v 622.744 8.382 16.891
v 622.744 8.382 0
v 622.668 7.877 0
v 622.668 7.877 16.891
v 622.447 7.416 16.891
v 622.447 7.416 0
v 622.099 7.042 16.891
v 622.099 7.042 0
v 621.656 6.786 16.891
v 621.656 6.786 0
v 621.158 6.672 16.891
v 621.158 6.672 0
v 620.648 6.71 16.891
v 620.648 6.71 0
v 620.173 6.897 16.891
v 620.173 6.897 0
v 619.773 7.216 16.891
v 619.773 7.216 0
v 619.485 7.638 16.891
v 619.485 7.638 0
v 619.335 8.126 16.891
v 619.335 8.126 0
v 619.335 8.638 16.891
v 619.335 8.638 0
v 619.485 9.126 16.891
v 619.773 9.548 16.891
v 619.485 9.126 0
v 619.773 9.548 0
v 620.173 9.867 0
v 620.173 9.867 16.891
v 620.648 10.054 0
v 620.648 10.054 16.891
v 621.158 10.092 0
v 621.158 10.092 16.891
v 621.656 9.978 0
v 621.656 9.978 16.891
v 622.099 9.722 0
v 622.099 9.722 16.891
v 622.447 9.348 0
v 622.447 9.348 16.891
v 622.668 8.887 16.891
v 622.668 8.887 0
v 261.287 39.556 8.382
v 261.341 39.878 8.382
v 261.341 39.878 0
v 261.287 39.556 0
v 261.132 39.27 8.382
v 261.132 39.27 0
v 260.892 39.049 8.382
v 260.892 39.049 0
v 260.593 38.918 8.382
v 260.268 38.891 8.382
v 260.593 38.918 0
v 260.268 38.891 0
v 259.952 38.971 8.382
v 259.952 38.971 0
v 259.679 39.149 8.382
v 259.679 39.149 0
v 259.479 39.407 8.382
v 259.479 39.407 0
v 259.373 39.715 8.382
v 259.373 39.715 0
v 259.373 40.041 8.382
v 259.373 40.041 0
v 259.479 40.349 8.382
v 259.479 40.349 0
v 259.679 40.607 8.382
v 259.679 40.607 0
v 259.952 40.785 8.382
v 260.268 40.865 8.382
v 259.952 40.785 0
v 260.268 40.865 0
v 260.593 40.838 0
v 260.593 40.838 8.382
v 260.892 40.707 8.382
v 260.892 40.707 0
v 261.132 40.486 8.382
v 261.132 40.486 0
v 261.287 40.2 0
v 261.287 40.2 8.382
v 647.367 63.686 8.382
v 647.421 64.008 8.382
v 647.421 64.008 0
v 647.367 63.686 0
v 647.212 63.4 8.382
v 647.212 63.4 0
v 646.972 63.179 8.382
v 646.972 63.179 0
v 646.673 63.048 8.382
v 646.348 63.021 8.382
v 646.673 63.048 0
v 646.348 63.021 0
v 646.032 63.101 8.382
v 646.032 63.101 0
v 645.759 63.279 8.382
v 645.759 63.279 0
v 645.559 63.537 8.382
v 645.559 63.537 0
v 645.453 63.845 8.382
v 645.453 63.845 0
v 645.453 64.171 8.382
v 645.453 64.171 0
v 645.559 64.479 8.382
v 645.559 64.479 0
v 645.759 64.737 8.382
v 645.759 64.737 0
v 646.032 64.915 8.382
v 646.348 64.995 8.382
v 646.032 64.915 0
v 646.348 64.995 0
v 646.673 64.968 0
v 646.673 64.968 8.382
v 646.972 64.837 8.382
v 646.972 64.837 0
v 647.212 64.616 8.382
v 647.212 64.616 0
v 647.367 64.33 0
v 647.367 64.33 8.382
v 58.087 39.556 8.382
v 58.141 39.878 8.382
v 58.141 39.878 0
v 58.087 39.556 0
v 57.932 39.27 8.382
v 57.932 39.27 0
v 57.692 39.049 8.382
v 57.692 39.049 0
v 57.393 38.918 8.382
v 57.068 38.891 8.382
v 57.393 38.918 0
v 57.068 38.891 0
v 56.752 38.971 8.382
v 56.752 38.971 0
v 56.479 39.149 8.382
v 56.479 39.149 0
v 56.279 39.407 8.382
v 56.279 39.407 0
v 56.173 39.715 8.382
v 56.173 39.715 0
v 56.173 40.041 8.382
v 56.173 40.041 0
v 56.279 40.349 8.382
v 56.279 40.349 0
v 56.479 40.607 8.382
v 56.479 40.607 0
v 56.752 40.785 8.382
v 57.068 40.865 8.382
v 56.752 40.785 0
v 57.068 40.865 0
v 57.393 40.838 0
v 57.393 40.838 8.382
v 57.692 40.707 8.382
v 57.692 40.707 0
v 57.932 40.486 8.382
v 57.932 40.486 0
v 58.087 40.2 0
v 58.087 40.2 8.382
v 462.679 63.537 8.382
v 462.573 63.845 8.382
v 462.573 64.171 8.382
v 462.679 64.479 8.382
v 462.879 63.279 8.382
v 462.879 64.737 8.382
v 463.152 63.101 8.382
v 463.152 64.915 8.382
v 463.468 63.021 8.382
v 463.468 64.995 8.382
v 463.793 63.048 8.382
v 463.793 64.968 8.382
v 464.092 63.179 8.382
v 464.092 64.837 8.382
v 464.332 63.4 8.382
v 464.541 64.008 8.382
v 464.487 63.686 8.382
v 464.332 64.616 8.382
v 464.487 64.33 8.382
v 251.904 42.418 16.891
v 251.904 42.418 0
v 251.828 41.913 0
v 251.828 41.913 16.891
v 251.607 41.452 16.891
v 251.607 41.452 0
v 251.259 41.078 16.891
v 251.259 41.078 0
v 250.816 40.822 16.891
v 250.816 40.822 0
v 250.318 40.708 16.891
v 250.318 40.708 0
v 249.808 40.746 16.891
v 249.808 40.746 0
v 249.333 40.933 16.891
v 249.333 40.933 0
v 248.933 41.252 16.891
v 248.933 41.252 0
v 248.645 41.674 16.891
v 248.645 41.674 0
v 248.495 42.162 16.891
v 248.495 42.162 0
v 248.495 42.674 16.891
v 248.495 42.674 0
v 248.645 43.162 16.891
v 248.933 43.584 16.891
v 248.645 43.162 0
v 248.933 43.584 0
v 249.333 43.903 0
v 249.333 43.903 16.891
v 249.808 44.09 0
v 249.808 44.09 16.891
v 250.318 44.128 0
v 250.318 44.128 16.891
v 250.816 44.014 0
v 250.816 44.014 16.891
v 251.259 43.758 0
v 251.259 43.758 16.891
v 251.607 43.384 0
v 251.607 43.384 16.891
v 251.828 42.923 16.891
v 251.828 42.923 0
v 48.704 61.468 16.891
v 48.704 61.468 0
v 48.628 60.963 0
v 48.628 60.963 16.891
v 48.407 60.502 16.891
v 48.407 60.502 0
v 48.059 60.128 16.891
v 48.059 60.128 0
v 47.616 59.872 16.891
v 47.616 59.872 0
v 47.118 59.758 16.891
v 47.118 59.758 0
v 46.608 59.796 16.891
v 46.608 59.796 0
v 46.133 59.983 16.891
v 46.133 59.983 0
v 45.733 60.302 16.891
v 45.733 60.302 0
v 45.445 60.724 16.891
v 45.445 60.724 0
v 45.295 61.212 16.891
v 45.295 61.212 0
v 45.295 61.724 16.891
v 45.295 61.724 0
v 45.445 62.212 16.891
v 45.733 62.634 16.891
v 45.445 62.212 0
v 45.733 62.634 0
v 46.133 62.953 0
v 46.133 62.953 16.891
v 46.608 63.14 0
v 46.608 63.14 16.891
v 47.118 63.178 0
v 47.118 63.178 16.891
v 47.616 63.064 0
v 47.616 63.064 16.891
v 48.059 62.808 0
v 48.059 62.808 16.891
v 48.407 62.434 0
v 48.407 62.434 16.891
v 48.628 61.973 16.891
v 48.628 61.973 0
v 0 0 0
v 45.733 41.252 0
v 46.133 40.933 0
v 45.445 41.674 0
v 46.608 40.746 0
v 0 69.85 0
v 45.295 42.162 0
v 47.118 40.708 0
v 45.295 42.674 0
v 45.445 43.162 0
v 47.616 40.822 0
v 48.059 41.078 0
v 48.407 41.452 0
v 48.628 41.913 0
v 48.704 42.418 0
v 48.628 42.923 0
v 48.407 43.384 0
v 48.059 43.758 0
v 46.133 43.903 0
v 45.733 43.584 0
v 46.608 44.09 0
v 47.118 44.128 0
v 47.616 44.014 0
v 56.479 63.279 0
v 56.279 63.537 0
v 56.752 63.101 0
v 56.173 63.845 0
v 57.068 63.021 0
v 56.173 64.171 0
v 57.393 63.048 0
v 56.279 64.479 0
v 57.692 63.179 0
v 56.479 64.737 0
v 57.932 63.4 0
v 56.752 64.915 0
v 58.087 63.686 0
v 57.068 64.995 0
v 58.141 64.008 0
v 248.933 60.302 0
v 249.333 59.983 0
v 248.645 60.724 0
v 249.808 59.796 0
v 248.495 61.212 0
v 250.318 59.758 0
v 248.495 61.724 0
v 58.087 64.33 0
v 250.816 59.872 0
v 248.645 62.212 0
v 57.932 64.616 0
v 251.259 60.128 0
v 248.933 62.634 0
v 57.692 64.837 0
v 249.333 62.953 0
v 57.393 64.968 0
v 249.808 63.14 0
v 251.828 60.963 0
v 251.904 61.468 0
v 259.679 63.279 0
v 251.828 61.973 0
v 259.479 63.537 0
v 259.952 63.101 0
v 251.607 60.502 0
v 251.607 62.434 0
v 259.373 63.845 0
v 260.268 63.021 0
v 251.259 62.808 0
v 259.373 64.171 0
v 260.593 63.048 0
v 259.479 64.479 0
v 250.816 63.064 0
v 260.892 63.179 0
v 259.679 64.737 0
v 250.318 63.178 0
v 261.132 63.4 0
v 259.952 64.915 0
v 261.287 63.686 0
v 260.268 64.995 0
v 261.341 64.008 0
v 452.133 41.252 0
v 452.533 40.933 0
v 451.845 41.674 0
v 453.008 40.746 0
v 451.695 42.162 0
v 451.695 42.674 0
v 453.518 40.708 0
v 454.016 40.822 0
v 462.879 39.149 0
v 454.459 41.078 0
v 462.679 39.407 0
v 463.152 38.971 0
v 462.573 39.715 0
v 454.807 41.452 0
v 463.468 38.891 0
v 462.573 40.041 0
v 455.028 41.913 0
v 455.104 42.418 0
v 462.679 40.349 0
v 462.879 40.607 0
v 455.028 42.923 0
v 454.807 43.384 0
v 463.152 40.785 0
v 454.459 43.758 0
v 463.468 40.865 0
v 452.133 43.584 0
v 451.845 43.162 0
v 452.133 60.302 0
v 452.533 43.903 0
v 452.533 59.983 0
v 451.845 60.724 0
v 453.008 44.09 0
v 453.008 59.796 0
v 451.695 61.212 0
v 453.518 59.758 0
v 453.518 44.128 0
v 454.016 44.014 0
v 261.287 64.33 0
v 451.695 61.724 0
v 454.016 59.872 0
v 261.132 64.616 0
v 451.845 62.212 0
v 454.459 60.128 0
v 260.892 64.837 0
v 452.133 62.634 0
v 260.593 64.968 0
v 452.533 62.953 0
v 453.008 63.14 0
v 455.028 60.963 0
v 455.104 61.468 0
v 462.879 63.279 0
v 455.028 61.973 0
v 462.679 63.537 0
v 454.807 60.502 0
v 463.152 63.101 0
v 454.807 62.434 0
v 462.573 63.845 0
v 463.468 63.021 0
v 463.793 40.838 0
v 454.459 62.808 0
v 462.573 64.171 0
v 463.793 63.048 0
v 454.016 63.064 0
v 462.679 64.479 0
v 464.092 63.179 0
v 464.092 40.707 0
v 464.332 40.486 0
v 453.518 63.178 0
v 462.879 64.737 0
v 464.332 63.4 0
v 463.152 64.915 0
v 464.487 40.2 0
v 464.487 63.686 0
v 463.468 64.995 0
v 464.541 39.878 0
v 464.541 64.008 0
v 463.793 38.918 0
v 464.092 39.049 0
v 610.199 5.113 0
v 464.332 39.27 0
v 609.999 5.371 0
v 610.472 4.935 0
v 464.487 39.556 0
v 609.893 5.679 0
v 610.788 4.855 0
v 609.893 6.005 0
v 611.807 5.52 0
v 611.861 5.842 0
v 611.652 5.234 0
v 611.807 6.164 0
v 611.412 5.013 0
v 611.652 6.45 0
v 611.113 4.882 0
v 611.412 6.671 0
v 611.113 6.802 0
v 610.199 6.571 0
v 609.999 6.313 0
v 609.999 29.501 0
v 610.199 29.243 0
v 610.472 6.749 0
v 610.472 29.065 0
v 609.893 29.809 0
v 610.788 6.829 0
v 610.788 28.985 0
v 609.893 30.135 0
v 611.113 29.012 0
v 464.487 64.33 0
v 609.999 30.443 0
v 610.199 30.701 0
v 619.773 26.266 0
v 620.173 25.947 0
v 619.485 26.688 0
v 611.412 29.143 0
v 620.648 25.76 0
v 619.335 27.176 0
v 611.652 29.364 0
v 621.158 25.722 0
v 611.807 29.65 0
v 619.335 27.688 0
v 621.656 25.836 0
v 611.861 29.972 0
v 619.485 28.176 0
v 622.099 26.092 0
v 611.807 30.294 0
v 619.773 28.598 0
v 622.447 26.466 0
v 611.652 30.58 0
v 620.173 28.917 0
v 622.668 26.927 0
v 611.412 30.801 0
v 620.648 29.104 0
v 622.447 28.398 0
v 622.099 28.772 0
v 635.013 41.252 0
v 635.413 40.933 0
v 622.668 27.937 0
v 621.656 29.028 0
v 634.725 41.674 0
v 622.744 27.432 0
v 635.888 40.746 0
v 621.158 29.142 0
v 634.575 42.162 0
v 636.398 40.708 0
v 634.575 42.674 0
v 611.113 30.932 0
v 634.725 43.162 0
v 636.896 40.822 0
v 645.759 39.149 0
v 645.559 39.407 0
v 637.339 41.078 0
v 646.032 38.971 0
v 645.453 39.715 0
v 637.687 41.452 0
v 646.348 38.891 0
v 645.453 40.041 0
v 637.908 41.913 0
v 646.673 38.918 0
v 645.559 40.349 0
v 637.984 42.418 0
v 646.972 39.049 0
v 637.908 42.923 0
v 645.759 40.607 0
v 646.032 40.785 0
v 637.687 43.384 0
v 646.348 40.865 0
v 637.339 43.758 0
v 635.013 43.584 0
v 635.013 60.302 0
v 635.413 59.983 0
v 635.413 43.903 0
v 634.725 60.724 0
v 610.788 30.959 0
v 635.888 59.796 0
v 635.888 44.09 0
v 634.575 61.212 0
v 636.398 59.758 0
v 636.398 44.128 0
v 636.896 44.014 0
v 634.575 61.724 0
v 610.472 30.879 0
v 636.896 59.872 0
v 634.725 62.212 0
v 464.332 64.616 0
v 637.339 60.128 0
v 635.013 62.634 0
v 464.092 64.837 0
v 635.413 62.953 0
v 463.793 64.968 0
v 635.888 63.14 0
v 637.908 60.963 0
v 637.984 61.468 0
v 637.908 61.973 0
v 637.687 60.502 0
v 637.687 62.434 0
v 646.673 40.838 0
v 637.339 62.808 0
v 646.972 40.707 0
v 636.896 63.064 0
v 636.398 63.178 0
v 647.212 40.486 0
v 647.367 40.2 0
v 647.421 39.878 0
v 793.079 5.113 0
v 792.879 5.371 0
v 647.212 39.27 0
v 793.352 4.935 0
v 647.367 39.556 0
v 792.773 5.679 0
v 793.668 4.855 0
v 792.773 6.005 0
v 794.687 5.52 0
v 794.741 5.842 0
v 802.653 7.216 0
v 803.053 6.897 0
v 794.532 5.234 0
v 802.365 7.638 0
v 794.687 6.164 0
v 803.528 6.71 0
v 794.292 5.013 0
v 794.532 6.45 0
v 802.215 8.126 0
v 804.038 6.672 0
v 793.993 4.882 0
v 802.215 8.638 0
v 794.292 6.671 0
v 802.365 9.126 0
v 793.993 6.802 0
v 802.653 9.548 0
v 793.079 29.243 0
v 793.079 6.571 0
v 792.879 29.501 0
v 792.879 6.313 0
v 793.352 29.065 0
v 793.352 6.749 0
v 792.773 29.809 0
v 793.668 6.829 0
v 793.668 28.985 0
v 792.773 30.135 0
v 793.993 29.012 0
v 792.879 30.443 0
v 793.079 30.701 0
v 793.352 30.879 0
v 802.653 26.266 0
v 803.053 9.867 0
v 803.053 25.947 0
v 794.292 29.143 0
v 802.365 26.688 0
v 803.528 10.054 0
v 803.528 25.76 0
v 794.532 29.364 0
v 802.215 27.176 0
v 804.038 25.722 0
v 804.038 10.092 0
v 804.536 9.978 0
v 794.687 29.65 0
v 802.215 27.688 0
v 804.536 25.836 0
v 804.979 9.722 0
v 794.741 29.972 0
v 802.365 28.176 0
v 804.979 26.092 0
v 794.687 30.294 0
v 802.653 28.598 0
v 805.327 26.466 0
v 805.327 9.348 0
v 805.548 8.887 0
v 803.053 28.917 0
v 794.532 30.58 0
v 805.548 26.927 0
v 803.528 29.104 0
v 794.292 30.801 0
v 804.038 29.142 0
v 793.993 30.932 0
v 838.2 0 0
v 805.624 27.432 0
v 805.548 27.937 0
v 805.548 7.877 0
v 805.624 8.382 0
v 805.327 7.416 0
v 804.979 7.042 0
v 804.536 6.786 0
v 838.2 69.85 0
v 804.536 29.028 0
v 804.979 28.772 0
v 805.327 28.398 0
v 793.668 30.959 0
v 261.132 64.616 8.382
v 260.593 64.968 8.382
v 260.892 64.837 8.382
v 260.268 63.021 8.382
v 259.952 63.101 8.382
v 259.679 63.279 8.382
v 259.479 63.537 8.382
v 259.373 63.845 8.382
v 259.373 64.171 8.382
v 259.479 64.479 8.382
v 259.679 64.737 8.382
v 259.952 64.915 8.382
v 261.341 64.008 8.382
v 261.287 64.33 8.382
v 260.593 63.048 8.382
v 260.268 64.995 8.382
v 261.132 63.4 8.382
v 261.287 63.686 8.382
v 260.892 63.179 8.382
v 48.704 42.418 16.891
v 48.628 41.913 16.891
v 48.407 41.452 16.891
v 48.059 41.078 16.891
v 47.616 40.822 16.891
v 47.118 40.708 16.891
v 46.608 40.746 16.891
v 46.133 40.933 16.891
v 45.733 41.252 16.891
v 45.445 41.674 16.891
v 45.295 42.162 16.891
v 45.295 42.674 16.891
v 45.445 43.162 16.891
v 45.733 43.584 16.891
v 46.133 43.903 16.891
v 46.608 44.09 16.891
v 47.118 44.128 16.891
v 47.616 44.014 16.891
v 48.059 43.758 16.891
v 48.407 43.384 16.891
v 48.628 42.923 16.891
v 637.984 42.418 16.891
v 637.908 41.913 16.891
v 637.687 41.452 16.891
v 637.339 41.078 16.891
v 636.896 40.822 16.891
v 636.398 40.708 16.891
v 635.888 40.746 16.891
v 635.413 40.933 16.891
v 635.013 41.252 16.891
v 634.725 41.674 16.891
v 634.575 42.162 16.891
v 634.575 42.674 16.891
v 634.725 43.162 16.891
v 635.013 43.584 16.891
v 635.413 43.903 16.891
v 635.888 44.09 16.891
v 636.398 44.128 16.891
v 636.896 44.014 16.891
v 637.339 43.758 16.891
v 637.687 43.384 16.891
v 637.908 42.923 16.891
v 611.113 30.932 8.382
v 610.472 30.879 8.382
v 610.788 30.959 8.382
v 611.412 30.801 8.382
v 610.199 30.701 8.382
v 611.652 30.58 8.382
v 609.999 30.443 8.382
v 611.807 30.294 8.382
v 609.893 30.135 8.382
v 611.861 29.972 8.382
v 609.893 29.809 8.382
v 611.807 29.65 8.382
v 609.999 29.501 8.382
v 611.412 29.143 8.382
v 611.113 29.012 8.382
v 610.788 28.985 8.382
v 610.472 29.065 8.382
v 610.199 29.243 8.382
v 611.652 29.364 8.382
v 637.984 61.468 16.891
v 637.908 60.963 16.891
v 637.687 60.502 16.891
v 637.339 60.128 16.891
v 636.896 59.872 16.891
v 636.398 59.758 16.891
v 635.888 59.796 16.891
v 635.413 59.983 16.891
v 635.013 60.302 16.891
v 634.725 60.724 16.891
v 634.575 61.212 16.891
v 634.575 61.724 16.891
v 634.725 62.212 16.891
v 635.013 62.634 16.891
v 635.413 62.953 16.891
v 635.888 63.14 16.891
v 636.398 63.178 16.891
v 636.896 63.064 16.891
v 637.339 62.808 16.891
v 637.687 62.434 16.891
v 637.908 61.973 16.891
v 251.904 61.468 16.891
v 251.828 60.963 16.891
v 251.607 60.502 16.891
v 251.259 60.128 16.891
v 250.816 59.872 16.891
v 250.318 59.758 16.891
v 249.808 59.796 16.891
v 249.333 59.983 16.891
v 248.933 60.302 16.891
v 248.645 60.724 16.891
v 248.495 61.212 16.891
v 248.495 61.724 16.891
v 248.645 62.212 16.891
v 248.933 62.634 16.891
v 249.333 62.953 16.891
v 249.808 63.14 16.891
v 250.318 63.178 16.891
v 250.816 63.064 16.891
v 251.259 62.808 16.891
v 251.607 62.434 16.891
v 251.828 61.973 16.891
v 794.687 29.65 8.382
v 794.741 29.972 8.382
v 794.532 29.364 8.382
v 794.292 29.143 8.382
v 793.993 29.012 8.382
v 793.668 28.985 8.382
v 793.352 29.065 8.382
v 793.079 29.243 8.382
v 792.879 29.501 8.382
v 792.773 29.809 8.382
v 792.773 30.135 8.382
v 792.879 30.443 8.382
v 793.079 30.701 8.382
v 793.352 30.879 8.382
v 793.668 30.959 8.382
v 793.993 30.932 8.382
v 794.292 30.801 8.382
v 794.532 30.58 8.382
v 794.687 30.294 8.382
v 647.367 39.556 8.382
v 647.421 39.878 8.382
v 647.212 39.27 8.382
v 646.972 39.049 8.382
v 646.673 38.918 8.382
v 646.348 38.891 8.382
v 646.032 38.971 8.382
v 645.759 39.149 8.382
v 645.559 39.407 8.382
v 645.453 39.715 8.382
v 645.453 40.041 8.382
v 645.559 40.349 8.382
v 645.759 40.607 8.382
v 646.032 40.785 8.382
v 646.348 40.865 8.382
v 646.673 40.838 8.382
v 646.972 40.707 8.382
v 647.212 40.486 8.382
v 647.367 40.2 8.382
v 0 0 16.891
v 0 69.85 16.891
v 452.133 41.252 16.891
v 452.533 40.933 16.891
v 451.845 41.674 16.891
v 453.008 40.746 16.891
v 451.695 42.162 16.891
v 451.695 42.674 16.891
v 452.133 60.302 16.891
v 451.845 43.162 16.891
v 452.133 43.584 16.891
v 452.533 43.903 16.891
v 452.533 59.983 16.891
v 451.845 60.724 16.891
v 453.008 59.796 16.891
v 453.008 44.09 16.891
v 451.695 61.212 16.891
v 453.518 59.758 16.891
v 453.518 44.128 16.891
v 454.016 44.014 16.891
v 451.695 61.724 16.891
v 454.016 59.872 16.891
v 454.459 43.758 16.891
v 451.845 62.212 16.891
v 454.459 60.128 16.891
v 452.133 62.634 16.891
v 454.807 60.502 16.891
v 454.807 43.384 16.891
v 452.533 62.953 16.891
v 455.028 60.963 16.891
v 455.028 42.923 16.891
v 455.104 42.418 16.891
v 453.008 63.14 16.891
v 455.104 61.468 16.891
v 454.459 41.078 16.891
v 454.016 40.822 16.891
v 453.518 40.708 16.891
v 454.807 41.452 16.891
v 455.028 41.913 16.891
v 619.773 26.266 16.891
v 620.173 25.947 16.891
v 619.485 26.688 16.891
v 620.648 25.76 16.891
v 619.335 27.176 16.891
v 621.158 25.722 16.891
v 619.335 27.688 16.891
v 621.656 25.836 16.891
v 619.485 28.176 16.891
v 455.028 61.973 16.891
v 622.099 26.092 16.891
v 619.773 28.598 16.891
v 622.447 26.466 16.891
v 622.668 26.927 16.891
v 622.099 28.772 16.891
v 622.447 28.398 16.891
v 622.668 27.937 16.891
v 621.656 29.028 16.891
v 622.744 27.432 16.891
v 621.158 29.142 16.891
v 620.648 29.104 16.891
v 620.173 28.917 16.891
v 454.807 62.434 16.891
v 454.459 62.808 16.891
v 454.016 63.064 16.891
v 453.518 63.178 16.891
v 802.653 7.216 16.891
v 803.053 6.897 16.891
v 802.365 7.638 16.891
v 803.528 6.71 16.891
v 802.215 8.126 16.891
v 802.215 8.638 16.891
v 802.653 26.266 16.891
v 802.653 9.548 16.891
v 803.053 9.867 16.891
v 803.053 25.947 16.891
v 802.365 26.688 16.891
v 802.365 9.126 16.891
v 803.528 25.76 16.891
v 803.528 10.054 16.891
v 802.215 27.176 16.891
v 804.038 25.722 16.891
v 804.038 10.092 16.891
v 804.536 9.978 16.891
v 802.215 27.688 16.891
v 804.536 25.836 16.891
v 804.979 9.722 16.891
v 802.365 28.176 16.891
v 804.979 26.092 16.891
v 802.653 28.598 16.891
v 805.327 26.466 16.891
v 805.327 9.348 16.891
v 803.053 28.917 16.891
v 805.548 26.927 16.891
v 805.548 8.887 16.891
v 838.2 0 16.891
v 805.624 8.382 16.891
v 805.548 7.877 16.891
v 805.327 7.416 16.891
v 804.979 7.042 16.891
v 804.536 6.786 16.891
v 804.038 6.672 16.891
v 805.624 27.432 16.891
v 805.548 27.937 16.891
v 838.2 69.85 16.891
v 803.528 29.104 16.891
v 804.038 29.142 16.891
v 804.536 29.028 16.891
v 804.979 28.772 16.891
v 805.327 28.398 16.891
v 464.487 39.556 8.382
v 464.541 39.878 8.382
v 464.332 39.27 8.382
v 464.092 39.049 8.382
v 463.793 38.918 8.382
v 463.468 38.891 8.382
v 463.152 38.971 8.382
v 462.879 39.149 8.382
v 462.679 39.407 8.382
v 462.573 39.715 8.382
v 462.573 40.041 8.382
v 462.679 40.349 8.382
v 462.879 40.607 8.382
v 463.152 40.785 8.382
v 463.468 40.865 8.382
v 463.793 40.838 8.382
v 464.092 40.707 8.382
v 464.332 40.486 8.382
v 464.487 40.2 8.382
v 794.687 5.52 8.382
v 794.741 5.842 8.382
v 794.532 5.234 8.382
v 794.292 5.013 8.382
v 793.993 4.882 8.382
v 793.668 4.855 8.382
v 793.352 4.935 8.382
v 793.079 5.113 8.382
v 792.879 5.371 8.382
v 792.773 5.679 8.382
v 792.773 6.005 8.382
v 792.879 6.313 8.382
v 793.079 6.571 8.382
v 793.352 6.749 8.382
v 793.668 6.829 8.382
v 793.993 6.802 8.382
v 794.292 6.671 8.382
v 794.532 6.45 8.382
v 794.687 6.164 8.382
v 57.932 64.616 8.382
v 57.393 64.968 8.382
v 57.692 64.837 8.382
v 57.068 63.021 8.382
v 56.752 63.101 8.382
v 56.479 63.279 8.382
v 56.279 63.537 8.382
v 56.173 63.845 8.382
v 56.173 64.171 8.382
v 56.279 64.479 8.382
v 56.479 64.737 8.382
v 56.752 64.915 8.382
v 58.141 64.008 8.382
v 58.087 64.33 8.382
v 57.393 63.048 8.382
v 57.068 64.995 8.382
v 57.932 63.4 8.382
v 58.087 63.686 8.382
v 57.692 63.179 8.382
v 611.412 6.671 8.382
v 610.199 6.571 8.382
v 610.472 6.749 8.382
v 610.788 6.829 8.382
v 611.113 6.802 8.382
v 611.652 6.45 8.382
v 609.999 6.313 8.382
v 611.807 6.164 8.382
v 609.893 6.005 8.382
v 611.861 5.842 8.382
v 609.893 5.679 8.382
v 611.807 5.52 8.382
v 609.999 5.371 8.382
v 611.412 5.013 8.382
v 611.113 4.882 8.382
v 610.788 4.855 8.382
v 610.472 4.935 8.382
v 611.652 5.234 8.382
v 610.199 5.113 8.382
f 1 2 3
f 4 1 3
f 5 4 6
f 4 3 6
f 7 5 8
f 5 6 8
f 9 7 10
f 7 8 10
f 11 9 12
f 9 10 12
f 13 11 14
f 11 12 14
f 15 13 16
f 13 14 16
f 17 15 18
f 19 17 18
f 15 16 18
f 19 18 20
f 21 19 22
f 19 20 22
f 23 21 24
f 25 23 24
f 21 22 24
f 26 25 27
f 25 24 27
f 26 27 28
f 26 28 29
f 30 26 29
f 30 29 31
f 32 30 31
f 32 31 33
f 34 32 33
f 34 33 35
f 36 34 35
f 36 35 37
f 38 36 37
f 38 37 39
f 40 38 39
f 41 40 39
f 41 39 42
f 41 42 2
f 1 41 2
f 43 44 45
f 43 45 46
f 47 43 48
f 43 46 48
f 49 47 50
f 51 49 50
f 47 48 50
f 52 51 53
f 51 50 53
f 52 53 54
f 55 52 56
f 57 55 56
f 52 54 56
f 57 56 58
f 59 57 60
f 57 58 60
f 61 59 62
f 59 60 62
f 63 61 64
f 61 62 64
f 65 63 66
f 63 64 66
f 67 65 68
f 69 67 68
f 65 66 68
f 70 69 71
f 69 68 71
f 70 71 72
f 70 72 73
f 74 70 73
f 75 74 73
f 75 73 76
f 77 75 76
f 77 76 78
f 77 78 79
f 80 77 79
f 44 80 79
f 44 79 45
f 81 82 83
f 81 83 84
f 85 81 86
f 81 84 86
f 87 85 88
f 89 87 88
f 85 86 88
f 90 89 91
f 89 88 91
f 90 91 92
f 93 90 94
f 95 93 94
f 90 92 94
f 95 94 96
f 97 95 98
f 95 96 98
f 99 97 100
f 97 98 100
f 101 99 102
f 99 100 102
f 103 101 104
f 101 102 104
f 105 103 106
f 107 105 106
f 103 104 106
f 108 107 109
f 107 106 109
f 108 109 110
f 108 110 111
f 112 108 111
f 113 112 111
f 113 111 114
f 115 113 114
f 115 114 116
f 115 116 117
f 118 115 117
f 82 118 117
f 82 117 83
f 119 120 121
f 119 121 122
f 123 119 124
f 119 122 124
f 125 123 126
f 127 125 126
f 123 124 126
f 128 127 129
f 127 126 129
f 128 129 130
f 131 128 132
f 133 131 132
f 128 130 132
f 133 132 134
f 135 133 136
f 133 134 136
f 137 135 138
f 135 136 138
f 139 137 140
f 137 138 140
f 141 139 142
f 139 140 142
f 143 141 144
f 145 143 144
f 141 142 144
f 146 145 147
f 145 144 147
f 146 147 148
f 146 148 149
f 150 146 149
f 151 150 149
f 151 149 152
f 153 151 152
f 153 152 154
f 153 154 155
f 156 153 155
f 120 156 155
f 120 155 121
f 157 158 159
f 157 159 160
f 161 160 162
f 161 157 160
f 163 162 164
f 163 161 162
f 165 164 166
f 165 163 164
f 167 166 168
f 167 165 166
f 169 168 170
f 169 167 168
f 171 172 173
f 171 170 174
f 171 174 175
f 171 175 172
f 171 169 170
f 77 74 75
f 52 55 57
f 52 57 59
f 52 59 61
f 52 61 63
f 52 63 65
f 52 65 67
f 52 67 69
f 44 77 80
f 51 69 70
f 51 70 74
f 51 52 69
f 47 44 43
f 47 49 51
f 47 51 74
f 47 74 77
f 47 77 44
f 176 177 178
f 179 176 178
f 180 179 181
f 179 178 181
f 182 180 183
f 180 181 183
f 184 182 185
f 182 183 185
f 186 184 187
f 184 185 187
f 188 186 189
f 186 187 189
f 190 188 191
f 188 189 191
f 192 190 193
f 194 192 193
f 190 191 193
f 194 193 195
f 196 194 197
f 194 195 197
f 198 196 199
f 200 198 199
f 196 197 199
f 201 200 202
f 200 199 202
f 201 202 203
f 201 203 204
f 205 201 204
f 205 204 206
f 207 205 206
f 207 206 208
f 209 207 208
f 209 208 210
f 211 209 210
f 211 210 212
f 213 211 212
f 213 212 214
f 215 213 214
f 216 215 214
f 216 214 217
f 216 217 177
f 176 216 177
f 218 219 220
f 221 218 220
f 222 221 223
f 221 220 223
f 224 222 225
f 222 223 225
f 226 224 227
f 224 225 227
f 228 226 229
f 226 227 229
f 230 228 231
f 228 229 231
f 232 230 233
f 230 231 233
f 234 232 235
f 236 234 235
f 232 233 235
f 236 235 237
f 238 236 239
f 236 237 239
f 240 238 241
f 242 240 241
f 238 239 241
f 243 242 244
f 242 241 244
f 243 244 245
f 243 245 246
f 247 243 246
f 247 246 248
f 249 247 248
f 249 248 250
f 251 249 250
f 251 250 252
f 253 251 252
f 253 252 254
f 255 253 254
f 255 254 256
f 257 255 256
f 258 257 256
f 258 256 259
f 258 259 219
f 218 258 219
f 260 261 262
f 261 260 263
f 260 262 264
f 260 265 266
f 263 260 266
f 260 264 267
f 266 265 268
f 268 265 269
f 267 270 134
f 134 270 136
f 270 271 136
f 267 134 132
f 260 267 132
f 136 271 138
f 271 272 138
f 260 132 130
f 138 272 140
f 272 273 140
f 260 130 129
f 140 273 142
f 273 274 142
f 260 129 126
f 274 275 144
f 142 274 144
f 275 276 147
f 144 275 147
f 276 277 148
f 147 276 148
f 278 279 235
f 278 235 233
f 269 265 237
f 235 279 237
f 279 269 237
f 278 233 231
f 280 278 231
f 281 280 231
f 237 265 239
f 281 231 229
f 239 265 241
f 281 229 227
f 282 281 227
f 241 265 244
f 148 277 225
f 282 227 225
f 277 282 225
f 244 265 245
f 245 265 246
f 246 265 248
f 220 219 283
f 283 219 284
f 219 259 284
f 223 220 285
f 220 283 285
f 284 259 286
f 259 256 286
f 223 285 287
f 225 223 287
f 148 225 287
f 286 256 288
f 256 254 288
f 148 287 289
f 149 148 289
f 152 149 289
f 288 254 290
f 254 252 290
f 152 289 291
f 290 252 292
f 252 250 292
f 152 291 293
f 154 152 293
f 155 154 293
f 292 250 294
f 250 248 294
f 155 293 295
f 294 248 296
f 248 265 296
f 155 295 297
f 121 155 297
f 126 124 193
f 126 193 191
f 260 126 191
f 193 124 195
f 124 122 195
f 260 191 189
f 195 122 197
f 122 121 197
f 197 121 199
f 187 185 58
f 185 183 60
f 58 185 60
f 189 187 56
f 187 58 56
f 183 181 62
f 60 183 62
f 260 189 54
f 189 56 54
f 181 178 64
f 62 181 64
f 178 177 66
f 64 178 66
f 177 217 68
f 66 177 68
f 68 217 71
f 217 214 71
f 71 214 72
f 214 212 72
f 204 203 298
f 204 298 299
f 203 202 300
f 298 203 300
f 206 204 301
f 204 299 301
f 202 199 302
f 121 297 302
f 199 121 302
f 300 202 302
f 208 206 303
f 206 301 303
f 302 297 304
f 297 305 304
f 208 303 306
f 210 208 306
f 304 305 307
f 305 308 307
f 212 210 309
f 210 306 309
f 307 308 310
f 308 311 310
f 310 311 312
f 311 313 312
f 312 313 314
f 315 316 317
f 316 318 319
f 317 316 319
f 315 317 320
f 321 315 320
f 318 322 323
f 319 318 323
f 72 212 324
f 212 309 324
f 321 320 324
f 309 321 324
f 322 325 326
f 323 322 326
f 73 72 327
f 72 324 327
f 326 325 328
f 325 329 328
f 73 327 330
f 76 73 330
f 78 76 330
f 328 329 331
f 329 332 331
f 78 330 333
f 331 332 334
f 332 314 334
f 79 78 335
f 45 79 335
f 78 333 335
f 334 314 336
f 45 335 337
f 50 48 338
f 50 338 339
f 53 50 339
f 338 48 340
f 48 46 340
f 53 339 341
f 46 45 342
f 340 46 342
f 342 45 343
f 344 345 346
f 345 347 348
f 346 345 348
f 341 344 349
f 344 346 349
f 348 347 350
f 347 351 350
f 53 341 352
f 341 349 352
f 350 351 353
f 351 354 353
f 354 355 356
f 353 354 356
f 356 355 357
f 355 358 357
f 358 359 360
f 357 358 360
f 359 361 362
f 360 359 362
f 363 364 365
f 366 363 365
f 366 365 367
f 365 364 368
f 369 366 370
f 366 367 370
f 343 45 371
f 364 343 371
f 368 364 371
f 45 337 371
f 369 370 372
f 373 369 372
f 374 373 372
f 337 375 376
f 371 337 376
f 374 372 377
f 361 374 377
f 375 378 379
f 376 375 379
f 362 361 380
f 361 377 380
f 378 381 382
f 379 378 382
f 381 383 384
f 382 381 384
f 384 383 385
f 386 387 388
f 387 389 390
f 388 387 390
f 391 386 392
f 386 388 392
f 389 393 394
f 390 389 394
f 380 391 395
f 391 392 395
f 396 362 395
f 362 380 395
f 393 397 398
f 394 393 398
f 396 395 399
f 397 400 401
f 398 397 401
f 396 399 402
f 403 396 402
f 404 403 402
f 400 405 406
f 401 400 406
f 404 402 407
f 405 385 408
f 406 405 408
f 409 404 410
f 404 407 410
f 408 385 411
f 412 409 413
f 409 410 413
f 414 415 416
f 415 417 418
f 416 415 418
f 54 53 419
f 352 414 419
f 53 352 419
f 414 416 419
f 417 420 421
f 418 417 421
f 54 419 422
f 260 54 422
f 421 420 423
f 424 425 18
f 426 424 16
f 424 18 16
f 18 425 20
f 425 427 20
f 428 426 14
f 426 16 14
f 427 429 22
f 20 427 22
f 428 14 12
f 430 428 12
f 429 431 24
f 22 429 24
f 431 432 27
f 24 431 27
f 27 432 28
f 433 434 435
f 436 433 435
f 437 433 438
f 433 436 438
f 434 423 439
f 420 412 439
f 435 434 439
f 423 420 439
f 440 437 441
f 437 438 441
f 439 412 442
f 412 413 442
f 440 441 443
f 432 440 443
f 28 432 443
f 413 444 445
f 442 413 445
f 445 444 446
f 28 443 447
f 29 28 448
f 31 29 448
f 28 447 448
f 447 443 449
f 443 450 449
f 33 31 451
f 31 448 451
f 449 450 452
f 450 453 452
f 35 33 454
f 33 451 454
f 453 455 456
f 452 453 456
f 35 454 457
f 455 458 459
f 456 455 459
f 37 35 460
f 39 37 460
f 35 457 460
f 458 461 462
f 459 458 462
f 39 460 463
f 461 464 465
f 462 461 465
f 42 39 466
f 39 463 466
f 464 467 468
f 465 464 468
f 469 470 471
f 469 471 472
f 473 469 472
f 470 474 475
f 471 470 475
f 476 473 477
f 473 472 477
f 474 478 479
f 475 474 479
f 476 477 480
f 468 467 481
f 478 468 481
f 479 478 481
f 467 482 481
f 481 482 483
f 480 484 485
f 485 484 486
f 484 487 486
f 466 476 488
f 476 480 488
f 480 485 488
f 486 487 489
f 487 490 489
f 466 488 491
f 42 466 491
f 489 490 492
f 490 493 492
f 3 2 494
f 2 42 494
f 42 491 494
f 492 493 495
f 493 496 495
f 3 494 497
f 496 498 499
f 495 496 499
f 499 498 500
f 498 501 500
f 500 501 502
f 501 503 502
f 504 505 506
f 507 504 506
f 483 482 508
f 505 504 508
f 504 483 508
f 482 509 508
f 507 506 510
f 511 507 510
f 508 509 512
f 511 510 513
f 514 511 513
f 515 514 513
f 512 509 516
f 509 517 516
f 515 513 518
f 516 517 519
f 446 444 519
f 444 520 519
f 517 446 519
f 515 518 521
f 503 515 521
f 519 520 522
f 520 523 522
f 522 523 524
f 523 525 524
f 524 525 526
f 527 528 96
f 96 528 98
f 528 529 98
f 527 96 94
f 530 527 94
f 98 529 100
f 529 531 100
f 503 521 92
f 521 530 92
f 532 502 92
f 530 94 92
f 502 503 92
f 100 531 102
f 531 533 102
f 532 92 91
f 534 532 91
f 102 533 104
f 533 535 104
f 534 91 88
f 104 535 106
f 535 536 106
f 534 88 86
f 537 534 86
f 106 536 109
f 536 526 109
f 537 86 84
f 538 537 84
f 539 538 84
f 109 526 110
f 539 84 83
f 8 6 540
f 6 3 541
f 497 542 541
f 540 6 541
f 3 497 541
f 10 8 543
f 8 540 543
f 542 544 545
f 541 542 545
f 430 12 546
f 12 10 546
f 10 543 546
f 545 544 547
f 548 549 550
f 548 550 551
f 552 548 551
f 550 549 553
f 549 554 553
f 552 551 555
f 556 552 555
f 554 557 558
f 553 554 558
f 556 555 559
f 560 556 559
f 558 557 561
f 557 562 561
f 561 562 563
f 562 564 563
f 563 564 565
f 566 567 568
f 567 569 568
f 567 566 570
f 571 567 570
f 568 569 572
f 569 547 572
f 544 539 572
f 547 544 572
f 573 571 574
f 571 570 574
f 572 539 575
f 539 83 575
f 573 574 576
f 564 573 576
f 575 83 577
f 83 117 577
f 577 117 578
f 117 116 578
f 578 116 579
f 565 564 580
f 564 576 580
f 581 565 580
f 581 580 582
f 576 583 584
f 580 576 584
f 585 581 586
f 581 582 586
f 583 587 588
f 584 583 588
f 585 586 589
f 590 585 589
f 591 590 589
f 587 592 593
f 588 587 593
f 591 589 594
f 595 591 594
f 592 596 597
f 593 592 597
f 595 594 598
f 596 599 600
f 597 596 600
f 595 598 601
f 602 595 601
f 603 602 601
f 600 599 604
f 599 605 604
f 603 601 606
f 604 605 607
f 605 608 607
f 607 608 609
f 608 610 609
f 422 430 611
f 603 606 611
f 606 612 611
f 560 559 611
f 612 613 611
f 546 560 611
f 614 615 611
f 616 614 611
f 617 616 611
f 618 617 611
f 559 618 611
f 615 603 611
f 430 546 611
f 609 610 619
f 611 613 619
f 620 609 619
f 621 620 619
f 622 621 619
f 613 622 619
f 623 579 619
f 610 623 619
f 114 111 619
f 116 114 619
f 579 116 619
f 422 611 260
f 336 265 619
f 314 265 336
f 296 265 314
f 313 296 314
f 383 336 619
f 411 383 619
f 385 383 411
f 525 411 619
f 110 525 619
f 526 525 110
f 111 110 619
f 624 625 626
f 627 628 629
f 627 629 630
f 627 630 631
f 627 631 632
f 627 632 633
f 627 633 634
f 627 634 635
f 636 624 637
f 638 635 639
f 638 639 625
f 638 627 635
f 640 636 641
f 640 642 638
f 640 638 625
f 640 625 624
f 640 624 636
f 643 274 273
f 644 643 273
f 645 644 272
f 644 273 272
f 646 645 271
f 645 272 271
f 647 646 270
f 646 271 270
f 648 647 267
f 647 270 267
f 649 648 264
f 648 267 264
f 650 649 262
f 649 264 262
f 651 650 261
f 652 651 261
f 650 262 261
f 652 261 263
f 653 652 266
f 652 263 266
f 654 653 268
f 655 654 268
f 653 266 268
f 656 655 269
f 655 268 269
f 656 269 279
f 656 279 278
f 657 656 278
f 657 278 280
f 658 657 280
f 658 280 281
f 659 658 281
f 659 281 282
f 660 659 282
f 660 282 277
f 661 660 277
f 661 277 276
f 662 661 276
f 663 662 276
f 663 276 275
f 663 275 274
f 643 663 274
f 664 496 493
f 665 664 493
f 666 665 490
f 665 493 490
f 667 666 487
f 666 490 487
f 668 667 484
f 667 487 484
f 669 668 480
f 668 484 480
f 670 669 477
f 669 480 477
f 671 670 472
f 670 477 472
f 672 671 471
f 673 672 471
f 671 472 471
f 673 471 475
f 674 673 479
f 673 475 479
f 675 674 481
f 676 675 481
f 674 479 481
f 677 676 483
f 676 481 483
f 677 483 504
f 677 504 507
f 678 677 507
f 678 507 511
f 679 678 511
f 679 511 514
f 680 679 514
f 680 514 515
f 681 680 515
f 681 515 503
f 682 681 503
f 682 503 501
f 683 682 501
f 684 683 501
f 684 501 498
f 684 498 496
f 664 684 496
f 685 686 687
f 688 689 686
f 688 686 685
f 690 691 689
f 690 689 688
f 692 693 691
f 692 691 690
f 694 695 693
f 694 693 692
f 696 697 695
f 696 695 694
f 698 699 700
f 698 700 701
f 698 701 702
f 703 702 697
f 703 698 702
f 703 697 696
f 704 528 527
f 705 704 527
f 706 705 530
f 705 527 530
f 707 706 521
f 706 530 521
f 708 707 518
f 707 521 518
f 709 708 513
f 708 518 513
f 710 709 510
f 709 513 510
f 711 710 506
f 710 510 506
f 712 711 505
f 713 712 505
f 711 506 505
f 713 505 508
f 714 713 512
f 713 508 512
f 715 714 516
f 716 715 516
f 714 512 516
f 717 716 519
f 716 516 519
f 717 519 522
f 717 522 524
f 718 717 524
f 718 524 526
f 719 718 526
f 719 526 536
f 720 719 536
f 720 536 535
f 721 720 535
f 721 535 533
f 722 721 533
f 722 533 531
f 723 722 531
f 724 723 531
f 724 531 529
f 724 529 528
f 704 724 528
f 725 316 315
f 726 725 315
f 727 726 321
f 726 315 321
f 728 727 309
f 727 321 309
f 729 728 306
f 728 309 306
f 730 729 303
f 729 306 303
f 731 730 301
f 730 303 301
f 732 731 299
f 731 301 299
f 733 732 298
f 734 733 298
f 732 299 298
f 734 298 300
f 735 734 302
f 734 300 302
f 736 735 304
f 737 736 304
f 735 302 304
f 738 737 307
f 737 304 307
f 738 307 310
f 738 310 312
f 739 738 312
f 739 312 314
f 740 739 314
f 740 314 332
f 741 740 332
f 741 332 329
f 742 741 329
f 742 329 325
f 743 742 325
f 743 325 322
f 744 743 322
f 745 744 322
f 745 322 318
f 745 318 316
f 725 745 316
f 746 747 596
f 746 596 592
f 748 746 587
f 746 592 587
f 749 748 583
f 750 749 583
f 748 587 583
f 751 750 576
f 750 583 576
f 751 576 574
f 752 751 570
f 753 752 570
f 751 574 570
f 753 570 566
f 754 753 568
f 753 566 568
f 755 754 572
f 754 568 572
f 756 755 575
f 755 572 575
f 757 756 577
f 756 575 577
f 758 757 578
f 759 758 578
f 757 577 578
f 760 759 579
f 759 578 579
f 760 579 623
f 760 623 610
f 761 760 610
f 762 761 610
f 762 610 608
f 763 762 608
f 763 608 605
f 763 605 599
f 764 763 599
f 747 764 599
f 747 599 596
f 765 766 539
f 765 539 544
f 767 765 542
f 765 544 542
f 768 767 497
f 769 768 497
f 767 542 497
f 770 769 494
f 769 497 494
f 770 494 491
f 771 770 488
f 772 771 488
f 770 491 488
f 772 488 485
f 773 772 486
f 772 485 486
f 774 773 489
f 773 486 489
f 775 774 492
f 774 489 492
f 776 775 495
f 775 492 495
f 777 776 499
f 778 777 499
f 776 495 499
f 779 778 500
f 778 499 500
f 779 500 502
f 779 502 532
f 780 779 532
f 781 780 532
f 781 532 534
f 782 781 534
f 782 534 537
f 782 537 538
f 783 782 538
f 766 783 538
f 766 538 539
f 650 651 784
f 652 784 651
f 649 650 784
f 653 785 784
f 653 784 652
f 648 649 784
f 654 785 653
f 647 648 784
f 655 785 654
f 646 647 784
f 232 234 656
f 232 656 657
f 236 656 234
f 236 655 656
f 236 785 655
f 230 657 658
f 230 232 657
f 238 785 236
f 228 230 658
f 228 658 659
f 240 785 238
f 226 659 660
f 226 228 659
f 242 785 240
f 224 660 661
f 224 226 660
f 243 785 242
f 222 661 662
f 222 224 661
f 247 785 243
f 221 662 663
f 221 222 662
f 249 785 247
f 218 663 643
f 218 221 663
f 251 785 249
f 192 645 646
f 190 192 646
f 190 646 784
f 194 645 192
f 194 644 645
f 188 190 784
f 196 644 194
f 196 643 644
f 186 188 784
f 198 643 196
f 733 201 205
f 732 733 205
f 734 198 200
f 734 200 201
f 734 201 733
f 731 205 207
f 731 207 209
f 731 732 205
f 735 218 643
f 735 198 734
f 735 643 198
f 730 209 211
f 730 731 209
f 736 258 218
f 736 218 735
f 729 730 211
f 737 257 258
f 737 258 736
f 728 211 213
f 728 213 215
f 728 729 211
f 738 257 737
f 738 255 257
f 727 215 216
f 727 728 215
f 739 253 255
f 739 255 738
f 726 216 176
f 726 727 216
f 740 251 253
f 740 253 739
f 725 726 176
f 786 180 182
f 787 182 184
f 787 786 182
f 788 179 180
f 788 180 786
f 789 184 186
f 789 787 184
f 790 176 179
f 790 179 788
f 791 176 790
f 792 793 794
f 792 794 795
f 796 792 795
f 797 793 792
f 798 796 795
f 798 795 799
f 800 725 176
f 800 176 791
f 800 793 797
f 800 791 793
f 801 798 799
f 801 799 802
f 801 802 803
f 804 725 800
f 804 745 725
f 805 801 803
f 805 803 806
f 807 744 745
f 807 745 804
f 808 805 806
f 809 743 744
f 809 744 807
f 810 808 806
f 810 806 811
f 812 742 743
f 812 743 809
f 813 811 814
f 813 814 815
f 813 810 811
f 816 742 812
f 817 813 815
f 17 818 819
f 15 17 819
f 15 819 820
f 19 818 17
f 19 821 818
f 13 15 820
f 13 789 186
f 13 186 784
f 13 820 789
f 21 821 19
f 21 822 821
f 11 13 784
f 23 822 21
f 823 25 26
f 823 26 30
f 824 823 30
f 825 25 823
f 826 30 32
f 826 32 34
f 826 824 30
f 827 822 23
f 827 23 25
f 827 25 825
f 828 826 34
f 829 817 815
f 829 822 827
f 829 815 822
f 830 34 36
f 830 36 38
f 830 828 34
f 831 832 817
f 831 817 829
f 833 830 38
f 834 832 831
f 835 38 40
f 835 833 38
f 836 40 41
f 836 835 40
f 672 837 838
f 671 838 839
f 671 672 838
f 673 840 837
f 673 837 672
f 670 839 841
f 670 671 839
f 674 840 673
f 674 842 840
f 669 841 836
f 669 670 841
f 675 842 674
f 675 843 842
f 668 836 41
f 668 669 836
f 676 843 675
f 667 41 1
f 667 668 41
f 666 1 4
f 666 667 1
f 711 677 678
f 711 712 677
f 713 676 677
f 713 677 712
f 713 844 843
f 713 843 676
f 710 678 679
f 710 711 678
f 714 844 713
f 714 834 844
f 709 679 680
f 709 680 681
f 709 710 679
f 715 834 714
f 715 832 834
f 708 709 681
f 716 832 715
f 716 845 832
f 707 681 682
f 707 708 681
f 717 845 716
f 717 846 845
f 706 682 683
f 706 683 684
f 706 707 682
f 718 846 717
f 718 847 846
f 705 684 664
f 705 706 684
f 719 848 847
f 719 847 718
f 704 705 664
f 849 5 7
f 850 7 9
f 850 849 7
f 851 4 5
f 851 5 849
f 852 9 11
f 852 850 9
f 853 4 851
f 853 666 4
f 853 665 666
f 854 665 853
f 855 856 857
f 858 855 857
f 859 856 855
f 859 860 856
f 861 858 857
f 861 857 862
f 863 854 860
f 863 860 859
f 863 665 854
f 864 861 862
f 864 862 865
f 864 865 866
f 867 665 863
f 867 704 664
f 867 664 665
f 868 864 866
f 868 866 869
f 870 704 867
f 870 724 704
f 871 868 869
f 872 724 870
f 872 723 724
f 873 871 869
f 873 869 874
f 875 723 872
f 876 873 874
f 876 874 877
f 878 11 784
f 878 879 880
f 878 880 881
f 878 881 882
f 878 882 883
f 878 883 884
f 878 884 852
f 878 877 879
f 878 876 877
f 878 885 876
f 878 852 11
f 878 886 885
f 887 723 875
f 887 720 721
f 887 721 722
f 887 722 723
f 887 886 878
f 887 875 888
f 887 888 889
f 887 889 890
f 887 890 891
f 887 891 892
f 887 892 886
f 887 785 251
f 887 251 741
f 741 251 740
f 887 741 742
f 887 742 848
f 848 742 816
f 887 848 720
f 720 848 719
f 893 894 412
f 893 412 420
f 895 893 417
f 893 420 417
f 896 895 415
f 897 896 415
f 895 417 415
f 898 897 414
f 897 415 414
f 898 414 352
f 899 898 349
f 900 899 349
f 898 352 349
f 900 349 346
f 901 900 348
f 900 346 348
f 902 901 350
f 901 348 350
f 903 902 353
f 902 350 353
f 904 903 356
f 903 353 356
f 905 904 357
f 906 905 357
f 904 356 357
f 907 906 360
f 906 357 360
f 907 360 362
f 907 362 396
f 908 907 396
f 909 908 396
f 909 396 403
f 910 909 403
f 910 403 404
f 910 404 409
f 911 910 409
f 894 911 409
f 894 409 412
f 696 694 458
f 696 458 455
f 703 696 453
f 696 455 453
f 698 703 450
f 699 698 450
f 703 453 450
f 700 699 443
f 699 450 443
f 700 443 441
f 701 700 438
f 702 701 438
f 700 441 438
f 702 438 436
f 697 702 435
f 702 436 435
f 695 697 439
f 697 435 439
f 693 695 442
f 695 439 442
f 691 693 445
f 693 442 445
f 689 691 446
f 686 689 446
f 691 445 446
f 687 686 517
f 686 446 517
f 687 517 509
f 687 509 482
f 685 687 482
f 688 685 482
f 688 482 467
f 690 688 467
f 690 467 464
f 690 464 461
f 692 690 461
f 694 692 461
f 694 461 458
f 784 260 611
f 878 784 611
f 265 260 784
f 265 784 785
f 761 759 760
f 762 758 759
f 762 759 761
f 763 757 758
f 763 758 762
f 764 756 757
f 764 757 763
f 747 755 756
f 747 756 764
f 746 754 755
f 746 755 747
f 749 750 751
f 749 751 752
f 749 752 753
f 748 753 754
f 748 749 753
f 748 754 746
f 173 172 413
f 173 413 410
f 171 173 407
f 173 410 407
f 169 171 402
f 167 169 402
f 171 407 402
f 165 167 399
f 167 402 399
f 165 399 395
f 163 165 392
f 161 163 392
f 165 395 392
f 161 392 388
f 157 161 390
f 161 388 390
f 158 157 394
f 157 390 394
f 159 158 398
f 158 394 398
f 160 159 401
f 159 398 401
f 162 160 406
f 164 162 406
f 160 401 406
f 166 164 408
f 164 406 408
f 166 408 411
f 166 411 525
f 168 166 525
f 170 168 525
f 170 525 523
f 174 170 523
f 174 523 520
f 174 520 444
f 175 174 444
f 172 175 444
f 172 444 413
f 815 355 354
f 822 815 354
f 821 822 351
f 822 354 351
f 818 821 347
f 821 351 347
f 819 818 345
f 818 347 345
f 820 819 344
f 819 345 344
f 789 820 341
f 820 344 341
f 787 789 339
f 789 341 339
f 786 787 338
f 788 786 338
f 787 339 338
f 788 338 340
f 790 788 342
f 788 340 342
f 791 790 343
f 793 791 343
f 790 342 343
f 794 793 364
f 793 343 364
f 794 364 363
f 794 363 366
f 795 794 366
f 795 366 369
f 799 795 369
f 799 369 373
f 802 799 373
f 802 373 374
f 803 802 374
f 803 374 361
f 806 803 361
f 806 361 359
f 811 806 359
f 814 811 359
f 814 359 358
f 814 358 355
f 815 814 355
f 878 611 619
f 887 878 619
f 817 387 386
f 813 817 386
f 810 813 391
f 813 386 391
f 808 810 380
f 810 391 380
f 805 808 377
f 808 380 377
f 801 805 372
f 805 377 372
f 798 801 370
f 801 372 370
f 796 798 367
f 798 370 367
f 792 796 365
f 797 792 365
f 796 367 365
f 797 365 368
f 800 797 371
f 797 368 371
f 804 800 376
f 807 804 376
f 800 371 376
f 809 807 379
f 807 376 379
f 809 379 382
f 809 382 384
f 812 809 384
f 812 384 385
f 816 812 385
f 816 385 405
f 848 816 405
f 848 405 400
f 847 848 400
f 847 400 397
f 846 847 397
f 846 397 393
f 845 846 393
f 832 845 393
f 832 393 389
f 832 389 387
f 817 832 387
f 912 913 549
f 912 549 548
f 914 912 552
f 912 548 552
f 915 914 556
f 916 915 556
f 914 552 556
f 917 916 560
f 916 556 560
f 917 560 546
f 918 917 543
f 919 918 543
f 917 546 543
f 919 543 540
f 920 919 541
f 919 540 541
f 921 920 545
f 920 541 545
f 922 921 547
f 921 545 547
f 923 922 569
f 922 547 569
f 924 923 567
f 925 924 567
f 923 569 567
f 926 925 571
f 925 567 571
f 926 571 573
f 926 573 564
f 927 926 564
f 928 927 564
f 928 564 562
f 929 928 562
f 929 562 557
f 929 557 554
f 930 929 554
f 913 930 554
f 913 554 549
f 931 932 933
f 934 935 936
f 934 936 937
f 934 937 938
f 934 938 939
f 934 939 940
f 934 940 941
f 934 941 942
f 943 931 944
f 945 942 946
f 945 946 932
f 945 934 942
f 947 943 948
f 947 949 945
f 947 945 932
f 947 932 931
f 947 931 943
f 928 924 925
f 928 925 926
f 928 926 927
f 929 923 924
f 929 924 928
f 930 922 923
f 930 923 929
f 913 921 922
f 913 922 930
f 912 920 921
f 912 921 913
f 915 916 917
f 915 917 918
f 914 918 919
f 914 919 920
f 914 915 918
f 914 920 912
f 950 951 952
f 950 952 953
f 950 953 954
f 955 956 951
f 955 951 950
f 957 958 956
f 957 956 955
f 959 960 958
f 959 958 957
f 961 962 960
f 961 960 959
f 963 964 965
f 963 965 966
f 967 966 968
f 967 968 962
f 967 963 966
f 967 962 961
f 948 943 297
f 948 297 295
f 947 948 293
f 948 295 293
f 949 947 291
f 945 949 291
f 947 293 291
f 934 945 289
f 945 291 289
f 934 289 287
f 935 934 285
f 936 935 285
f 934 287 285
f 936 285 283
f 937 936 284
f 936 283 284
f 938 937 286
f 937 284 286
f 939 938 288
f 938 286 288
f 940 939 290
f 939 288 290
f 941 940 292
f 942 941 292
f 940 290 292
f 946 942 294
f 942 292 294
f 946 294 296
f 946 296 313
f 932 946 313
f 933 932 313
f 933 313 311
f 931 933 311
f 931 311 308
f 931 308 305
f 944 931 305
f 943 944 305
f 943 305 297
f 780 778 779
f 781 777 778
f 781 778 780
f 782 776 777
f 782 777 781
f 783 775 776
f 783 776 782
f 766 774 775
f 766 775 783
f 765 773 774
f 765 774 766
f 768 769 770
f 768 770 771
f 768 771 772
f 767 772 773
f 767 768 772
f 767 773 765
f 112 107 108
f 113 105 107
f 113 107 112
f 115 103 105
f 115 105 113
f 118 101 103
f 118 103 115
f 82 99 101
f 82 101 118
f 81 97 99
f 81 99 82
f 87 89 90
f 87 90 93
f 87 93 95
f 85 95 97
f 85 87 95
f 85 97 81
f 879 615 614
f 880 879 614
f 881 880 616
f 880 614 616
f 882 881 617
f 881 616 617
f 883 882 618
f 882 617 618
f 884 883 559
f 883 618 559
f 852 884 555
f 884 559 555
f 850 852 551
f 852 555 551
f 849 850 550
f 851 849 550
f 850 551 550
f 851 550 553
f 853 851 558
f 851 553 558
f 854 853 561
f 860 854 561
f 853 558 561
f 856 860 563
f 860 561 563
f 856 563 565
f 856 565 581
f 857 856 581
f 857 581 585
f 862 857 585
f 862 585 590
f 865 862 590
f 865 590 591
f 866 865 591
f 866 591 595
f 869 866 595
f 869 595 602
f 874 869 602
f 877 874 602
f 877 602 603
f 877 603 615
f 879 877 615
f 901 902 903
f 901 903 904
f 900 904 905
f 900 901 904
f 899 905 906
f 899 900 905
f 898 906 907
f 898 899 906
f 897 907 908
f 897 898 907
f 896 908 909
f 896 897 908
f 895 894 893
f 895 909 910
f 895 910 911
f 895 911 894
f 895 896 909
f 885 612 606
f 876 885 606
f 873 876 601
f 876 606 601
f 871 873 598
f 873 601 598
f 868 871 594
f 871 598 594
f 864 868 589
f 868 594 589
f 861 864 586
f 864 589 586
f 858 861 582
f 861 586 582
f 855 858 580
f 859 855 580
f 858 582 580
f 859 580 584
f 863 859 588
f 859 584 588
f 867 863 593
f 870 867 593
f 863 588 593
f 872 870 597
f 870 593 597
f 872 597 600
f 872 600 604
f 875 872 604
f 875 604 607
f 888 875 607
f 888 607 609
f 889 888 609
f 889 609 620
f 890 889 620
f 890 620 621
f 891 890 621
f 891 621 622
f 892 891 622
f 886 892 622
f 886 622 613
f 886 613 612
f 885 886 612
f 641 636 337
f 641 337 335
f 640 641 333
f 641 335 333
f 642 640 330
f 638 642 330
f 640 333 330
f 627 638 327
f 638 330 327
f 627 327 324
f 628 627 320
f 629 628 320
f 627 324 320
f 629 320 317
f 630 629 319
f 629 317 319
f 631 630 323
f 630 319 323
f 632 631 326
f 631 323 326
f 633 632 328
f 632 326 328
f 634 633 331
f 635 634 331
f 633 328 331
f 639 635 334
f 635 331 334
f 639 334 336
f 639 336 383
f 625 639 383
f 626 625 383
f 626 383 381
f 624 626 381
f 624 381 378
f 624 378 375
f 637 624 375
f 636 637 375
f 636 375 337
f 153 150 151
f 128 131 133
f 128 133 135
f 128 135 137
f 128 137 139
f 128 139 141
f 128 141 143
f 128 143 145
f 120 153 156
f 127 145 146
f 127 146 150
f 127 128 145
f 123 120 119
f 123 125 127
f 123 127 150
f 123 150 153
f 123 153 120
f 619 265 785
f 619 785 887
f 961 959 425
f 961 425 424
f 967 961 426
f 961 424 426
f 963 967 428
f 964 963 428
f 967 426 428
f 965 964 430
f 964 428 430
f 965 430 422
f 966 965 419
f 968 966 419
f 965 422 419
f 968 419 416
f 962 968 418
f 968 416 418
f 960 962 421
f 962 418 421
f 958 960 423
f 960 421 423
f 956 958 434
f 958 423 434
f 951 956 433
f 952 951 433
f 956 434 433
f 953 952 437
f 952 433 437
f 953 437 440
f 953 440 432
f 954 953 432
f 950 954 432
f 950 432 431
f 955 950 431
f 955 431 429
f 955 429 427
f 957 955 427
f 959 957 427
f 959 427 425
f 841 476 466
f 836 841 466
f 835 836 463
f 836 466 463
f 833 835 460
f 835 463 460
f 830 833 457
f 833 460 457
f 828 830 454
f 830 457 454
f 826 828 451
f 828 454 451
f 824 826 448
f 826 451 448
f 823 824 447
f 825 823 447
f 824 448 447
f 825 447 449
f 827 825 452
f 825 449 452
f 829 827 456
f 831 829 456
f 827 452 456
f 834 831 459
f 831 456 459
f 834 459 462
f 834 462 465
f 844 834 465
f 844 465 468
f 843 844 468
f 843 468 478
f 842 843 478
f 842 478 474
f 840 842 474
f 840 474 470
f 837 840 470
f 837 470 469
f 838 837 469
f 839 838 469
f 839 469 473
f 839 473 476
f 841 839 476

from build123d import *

# Parameters (mm, degrees)
F0_W     = 838.2
F0_H     = 69.85
F1_DEPTH = 16.891
F2_R     = 0.9906
F3_DEPTH = 8.382
F4_R     = 1.7145
F5_DEPTH = 25.4


with BuildPart() as f1:
    # F0 (on Top) → F1 (new body)
    with BuildSketch(Plane.XY):
        with Locations((419.1, 34.925)):
            Rectangle(F0_W, F0_H)
    extrude(amount=F1_DEPTH)

    # F2 (on face) → F3 (cut)
    with BuildSketch(Plane(origin=(0, 0, 0), x_dir=(1, 0, 0), z_dir=(0, 0, -1))):
        with Locations((793.75, -5.842)):
            Circle(F2_R)
        with Locations((793.75, -29.972)):
            Circle(F2_R)
        with Locations((646.43, -39.878)):
            Circle(F2_R)
        with Locations((646.43, -64.008)):
            Circle(F2_R)
        with Locations((463.55, -64.008)):
            Circle(F2_R)
        with Locations((610.87, -29.972)):
            Circle(F2_R)
        with Locations((463.55, -39.878)):
            Circle(F2_R)
        with Locations((610.87, -5.842)):
            Circle(F2_R)
        with Locations((260.35, -39.878)):
            Circle(F2_R)
        with Locations((260.35, -64.008)):
            Circle(F2_R)
        with Locations((57.15, -39.878)):
            Circle(F2_R)
        with Locations((57.15, -64.008)):
            Circle(F2_R)
    extrude(amount=-F3_DEPTH, mode=Mode.SUBTRACT)

    # F4 (on face) → F5 (cut)
    with BuildSketch(Plane(origin=(0, 0, 0), x_dir=(1, 0, 0), z_dir=(0, 0, -1))):
        with Locations((803.91, -8.382)):
            Circle(F4_R)
        with Locations((803.91, -27.432)):
            Circle(F4_R)
        with Locations((636.27, -42.418)):
            Circle(F4_R)
        with Locations((636.27, -61.468)):
            Circle(F4_R)
        with Locations((453.39, -42.418)):
            Circle(F4_R)
        with Locations((453.39, -61.468)):
            Circle(F4_R)
        with Locations((621.03, -27.432)):
            Circle(F4_R)
        with Locations((621.03, -8.382)):
            Circle(F4_R)
        with Locations((250.19, -42.418)):
            Circle(F4_R)
        with Locations((250.19, -61.468)):
            Circle(F4_R)
        with Locations((46.99, -42.418)):
            Circle(F4_R)
        with Locations((46.99, -61.468)):
            Circle(F4_R)
    extrude(amount=-F5_DEPTH, mode=Mode.SUBTRACT)


solid = f1.part
